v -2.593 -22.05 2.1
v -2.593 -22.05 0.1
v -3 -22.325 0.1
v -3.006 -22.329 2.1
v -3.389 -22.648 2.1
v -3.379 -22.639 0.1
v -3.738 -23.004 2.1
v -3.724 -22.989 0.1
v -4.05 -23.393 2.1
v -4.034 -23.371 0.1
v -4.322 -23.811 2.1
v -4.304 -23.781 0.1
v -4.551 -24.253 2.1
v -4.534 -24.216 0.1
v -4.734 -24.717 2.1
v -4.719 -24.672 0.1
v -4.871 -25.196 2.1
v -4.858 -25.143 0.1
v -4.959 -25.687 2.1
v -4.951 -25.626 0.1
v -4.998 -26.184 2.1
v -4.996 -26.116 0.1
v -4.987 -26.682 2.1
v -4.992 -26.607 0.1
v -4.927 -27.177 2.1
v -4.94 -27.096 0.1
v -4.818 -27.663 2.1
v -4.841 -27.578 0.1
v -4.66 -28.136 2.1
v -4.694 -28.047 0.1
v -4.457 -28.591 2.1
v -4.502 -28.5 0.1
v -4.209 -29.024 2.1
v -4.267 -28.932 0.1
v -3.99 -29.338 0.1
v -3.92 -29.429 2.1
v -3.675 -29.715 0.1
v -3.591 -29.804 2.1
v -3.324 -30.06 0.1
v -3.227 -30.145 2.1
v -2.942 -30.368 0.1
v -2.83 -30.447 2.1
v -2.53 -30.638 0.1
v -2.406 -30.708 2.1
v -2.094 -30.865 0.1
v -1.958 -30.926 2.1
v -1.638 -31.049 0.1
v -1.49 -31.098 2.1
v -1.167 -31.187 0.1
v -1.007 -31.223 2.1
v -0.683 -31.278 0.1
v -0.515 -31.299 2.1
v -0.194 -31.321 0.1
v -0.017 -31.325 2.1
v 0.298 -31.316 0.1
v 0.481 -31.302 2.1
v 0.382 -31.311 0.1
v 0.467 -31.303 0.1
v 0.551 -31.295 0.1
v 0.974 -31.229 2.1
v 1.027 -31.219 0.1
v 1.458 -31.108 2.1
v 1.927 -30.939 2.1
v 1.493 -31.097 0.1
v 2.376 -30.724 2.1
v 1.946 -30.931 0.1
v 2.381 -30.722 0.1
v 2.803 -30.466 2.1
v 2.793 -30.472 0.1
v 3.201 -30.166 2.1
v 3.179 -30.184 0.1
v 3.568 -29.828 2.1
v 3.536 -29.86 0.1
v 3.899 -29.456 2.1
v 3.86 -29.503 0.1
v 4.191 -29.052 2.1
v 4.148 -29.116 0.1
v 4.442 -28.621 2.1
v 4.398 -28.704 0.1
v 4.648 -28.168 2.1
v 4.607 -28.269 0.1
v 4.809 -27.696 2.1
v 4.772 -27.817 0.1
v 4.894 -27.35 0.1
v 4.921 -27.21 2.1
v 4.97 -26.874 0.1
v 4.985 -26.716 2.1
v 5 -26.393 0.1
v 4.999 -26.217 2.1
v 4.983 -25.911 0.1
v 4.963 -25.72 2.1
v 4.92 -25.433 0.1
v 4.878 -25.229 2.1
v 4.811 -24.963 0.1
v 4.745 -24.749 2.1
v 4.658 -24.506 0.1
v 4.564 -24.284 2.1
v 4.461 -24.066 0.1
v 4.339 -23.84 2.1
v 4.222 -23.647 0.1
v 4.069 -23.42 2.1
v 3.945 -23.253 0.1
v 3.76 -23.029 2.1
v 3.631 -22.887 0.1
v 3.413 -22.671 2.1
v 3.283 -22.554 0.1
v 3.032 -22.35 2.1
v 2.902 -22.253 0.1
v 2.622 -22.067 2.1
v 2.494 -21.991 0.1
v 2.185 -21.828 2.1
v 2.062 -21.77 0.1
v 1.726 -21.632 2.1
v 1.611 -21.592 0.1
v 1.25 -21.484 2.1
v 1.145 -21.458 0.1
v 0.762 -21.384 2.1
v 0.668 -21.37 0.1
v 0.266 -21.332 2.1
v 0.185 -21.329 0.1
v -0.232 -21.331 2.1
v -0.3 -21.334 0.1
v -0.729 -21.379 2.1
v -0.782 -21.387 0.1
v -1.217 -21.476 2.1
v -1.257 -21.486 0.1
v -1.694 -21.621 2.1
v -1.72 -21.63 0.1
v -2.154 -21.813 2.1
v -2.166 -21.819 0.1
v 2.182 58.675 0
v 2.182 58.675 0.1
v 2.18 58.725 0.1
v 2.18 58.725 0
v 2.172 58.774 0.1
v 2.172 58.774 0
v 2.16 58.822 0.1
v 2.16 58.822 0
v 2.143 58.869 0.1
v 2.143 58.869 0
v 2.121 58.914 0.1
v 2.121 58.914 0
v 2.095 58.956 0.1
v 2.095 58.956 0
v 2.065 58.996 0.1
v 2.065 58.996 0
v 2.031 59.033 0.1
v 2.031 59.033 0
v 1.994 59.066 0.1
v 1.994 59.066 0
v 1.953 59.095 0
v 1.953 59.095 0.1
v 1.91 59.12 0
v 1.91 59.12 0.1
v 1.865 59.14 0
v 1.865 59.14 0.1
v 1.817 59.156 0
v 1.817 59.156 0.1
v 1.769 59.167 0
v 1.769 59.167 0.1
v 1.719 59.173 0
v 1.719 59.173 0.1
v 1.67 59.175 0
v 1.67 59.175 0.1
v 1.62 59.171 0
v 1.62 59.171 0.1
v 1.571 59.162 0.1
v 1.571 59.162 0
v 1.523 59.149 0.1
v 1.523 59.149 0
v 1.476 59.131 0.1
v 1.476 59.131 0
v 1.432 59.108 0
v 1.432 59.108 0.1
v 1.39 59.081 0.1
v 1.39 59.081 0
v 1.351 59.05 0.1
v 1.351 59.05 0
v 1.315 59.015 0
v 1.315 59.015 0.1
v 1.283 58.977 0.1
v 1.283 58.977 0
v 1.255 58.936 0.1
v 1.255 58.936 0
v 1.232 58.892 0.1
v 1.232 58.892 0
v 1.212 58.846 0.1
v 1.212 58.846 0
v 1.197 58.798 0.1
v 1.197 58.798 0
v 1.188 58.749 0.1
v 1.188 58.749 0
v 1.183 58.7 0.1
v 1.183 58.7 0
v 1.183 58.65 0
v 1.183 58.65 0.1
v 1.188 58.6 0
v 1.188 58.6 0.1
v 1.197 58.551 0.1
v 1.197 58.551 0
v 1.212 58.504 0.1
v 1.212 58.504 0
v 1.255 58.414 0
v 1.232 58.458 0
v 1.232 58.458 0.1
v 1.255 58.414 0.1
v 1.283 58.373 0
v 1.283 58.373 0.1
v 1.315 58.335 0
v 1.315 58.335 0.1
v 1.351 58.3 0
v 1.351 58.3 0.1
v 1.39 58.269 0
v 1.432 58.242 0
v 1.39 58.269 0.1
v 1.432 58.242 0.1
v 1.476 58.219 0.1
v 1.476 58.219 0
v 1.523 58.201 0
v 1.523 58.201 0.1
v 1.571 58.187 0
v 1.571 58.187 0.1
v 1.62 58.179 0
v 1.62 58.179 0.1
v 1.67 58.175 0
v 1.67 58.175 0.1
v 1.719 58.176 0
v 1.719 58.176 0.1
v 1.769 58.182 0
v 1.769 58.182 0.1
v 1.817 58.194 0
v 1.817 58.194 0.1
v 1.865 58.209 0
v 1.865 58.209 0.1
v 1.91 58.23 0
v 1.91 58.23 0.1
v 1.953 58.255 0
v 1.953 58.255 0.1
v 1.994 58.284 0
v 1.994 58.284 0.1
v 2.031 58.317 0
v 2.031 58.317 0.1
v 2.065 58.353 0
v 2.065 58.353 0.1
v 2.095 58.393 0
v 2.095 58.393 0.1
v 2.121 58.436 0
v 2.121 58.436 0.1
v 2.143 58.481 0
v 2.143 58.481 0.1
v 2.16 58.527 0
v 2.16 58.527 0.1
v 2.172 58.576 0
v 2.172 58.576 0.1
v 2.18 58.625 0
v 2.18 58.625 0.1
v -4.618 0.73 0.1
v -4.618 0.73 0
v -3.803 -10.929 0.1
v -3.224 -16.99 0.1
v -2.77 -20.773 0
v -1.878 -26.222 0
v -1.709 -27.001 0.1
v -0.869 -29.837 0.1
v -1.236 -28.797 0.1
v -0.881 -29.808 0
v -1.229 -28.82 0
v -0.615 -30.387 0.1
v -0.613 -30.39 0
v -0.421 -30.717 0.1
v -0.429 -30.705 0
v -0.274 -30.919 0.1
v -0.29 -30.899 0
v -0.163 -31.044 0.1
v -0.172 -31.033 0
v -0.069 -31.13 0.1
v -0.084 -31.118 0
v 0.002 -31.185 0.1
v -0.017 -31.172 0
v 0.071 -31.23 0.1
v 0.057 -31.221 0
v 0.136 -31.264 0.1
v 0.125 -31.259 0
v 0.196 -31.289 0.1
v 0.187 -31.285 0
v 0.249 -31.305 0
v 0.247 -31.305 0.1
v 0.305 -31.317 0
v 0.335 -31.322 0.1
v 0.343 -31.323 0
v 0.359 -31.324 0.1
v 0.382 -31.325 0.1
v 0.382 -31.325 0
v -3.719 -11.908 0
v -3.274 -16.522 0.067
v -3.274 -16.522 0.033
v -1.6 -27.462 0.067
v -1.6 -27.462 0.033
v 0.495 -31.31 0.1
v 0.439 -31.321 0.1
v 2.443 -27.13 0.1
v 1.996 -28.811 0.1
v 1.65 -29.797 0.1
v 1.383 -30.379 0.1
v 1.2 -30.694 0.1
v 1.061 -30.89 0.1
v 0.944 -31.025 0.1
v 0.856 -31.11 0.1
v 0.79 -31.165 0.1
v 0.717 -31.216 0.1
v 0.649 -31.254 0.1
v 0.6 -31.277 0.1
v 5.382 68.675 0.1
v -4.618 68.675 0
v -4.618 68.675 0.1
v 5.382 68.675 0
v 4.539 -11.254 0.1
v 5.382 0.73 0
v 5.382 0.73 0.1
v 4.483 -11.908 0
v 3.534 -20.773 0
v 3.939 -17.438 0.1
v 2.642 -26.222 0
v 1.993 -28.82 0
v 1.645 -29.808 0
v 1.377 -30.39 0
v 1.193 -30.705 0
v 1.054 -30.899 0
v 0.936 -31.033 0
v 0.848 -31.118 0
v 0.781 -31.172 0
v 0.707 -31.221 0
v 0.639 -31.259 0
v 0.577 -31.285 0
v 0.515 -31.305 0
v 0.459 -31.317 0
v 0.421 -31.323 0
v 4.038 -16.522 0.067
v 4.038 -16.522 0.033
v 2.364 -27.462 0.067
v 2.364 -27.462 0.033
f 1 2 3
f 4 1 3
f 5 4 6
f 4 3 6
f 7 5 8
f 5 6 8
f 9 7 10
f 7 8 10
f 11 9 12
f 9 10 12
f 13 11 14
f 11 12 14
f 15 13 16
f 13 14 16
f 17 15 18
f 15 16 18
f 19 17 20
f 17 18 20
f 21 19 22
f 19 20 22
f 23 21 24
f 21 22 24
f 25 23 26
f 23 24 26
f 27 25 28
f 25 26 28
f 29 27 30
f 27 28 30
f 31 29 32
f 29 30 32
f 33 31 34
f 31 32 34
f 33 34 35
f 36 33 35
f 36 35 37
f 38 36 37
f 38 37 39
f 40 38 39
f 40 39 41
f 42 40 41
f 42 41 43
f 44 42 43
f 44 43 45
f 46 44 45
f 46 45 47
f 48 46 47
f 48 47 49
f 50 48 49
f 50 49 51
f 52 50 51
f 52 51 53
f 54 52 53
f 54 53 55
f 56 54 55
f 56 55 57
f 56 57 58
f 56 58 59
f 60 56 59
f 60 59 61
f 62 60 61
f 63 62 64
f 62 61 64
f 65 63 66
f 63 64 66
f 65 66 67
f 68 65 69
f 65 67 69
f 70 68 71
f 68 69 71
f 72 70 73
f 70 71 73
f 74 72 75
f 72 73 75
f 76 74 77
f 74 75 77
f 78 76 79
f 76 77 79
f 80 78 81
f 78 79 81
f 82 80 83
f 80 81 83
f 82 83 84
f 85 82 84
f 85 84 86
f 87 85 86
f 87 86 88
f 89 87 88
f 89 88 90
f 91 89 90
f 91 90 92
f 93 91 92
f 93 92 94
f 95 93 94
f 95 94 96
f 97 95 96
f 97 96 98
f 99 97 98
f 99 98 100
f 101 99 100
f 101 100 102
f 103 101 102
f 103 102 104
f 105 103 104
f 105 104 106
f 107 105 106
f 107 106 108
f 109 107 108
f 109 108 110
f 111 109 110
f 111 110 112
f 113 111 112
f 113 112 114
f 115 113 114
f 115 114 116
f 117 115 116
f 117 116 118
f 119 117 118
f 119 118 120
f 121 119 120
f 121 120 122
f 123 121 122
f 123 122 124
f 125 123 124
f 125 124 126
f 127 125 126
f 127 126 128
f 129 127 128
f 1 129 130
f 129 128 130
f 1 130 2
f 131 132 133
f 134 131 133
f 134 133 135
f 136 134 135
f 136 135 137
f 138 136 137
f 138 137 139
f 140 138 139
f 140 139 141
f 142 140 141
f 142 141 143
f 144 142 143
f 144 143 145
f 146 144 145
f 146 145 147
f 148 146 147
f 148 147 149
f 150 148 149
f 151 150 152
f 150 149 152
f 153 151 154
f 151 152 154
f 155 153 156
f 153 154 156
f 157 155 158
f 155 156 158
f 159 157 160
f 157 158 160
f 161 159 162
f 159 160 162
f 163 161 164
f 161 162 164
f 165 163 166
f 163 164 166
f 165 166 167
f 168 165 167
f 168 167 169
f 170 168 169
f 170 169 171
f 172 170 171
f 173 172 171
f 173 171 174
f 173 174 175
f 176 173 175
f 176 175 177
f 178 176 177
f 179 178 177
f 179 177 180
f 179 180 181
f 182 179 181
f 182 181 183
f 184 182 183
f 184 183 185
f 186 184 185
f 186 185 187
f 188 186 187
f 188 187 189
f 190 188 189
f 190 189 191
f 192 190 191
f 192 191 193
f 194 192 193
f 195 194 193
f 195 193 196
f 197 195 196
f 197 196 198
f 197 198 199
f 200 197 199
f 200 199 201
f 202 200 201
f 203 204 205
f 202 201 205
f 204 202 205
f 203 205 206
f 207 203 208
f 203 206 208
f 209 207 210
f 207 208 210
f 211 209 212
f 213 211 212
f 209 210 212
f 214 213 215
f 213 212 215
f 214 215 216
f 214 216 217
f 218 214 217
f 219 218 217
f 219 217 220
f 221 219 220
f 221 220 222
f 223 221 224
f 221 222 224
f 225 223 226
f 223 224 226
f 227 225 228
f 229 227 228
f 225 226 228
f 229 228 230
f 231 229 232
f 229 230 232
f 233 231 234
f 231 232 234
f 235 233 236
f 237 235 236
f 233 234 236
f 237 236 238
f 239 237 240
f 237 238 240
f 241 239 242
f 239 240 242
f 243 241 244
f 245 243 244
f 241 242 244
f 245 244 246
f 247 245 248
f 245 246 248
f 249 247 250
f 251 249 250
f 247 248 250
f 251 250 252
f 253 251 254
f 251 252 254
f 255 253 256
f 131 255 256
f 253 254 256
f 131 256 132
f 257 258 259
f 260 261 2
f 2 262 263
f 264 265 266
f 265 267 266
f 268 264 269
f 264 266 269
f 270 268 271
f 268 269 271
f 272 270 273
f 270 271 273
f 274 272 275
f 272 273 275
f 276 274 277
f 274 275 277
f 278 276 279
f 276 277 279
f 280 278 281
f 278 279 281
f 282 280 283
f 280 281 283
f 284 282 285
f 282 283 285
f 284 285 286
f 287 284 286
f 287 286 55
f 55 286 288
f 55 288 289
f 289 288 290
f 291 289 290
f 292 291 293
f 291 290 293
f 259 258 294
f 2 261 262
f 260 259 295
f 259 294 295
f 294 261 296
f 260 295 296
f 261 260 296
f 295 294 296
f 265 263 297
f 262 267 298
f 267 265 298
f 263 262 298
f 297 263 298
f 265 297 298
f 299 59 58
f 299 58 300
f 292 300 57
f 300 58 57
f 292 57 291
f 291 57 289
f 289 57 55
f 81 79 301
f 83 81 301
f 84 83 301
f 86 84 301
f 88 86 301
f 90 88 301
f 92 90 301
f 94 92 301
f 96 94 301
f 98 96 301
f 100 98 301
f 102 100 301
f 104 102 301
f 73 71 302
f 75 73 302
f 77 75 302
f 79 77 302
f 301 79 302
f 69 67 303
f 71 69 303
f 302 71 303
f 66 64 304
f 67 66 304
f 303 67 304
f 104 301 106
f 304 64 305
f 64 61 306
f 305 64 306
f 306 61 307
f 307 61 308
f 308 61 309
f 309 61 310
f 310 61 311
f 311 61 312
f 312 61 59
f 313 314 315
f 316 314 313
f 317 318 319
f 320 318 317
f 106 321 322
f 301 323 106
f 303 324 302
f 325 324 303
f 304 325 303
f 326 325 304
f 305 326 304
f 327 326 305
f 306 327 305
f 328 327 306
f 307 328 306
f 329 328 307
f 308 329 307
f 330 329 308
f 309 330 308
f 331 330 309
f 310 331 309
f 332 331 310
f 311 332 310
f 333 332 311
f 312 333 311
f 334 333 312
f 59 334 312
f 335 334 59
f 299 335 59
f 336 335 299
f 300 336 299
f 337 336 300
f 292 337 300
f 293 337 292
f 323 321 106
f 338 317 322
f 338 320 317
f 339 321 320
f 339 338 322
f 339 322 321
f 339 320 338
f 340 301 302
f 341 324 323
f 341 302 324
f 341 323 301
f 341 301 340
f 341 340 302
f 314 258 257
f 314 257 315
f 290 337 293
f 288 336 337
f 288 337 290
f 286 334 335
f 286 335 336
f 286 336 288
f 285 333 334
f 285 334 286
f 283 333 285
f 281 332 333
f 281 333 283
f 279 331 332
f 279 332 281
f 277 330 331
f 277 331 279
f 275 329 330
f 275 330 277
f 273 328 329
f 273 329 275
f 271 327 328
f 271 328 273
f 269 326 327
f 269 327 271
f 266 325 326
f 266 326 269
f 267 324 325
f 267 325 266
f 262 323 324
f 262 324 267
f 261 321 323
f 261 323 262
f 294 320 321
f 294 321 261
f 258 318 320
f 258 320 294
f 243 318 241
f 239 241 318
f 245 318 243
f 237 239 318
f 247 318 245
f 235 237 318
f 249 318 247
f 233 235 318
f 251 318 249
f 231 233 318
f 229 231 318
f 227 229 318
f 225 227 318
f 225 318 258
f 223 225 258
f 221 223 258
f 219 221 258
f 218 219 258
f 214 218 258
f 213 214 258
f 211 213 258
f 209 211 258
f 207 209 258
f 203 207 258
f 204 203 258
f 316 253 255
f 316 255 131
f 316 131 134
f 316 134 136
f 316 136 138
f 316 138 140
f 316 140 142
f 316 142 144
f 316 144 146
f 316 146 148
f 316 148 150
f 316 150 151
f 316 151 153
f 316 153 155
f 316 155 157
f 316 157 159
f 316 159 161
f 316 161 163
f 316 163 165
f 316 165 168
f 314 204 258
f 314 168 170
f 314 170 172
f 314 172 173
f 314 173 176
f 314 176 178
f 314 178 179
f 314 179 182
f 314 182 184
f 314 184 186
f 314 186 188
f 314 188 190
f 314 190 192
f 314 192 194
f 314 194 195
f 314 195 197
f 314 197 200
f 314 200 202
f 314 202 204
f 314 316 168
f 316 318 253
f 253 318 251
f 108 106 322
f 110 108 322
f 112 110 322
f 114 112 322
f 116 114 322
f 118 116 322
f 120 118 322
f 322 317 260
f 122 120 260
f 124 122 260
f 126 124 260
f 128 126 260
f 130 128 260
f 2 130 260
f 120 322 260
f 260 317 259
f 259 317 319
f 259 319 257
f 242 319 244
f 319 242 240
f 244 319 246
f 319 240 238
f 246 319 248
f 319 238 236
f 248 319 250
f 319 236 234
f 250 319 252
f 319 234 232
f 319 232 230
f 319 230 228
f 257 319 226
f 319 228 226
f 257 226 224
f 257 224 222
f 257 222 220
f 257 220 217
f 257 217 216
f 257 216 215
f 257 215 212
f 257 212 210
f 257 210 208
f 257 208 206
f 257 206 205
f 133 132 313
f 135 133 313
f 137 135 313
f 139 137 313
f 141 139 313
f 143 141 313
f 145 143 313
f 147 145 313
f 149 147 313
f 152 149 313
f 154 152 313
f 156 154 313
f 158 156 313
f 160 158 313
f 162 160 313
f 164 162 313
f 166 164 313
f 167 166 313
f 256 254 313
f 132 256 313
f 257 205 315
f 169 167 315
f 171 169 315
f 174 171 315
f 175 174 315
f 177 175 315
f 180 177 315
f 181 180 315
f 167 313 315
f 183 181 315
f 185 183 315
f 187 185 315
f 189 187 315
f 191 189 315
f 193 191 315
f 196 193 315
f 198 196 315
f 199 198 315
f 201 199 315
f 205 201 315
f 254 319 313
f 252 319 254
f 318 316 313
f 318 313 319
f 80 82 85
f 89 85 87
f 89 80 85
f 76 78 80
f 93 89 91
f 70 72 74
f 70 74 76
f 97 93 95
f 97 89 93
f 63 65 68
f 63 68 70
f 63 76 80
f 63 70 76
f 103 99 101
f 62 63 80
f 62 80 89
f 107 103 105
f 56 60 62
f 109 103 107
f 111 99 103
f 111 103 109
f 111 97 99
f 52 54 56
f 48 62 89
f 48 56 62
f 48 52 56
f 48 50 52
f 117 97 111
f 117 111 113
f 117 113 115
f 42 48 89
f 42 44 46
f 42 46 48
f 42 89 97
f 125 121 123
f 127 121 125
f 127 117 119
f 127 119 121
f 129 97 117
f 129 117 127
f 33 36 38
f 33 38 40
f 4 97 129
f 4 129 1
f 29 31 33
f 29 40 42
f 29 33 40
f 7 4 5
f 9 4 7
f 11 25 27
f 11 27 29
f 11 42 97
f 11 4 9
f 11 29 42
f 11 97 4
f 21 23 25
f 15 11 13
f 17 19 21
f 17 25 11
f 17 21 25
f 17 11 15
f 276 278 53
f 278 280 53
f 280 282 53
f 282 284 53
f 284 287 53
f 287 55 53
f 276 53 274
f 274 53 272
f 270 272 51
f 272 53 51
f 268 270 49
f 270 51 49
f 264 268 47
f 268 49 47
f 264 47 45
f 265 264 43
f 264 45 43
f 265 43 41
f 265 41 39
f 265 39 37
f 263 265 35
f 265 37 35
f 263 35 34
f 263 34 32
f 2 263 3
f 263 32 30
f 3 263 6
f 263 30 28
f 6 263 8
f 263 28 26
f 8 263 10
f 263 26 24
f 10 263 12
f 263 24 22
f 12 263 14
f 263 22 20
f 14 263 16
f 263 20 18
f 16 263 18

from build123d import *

# Parameters (mm, degrees)
RESSALTO_EXTRUS_O1_DEPTH = 0.1
ESBO_O2_R                = 5
RESSALTO_EXTRUS_O2_DEPTH = 2
ESBO_O3_R                = 0.5
CORTE_EXTRUS_O1_DEPTH    = 10


with BuildPart() as part:
    # Esboço1 → Ressalto-extrusão1 (new body)
    with BuildSketch(Plane.XY):
        with BuildLine():
            Line((-4.617998397, 68.674835442), (5.382001603, 68.674835442))
            Line((5.382001603, 68.674835442), (5.382001603, 0.729621909))
            add(Edge.make_bspline(
                [(5.382001603, 0.729621909), (4.210394845, -19.422014325), (2.511565046, -31.255242579), (0.382001603, -31.325164558)],
                knots=[0, 0, 0, 0, 1, 1, 1, 1], degree=3))
            add(Edge.make_bspline(
                [(-4.617998397, 0.729621909), (-3.446391639, -19.422014325), (-1.747561841, -31.255242579), (0.382001603, -31.325164558)],
                knots=[0, 0, 0, 0, 1, 1, 1, 1], degree=3))
            Line((-4.617998397, 0.729621909), (-4.617998397, 68.674835442))
        make_face()
    extrude(amount=RESSALTO_EXTRUS_O1_DEPTH)

    # Esboço2 → Ressalto-extrusão2 (add)
    with BuildSketch(Plane.XY.offset(0.1)):
        with Locations(Location((0, -26.325164558, 0), (0, 0, 121.235952795))):
            Circle(ESBO_O2_R)
    extrude(amount=RESSALTO_EXTRUS_O2_DEPTH)

    # Esboço3 → Corte-extrusão1 (cut)
    with BuildSketch(Plane.XY.offset(0.1)):
        with Locations((1.682001603, 58.674835442)):
            Circle(ESBO_O3_R)
    extrude(amount=-CORTE_EXTRUS_O1_DEPTH, mode=Mode.SUBTRACT)


solid = part.part
